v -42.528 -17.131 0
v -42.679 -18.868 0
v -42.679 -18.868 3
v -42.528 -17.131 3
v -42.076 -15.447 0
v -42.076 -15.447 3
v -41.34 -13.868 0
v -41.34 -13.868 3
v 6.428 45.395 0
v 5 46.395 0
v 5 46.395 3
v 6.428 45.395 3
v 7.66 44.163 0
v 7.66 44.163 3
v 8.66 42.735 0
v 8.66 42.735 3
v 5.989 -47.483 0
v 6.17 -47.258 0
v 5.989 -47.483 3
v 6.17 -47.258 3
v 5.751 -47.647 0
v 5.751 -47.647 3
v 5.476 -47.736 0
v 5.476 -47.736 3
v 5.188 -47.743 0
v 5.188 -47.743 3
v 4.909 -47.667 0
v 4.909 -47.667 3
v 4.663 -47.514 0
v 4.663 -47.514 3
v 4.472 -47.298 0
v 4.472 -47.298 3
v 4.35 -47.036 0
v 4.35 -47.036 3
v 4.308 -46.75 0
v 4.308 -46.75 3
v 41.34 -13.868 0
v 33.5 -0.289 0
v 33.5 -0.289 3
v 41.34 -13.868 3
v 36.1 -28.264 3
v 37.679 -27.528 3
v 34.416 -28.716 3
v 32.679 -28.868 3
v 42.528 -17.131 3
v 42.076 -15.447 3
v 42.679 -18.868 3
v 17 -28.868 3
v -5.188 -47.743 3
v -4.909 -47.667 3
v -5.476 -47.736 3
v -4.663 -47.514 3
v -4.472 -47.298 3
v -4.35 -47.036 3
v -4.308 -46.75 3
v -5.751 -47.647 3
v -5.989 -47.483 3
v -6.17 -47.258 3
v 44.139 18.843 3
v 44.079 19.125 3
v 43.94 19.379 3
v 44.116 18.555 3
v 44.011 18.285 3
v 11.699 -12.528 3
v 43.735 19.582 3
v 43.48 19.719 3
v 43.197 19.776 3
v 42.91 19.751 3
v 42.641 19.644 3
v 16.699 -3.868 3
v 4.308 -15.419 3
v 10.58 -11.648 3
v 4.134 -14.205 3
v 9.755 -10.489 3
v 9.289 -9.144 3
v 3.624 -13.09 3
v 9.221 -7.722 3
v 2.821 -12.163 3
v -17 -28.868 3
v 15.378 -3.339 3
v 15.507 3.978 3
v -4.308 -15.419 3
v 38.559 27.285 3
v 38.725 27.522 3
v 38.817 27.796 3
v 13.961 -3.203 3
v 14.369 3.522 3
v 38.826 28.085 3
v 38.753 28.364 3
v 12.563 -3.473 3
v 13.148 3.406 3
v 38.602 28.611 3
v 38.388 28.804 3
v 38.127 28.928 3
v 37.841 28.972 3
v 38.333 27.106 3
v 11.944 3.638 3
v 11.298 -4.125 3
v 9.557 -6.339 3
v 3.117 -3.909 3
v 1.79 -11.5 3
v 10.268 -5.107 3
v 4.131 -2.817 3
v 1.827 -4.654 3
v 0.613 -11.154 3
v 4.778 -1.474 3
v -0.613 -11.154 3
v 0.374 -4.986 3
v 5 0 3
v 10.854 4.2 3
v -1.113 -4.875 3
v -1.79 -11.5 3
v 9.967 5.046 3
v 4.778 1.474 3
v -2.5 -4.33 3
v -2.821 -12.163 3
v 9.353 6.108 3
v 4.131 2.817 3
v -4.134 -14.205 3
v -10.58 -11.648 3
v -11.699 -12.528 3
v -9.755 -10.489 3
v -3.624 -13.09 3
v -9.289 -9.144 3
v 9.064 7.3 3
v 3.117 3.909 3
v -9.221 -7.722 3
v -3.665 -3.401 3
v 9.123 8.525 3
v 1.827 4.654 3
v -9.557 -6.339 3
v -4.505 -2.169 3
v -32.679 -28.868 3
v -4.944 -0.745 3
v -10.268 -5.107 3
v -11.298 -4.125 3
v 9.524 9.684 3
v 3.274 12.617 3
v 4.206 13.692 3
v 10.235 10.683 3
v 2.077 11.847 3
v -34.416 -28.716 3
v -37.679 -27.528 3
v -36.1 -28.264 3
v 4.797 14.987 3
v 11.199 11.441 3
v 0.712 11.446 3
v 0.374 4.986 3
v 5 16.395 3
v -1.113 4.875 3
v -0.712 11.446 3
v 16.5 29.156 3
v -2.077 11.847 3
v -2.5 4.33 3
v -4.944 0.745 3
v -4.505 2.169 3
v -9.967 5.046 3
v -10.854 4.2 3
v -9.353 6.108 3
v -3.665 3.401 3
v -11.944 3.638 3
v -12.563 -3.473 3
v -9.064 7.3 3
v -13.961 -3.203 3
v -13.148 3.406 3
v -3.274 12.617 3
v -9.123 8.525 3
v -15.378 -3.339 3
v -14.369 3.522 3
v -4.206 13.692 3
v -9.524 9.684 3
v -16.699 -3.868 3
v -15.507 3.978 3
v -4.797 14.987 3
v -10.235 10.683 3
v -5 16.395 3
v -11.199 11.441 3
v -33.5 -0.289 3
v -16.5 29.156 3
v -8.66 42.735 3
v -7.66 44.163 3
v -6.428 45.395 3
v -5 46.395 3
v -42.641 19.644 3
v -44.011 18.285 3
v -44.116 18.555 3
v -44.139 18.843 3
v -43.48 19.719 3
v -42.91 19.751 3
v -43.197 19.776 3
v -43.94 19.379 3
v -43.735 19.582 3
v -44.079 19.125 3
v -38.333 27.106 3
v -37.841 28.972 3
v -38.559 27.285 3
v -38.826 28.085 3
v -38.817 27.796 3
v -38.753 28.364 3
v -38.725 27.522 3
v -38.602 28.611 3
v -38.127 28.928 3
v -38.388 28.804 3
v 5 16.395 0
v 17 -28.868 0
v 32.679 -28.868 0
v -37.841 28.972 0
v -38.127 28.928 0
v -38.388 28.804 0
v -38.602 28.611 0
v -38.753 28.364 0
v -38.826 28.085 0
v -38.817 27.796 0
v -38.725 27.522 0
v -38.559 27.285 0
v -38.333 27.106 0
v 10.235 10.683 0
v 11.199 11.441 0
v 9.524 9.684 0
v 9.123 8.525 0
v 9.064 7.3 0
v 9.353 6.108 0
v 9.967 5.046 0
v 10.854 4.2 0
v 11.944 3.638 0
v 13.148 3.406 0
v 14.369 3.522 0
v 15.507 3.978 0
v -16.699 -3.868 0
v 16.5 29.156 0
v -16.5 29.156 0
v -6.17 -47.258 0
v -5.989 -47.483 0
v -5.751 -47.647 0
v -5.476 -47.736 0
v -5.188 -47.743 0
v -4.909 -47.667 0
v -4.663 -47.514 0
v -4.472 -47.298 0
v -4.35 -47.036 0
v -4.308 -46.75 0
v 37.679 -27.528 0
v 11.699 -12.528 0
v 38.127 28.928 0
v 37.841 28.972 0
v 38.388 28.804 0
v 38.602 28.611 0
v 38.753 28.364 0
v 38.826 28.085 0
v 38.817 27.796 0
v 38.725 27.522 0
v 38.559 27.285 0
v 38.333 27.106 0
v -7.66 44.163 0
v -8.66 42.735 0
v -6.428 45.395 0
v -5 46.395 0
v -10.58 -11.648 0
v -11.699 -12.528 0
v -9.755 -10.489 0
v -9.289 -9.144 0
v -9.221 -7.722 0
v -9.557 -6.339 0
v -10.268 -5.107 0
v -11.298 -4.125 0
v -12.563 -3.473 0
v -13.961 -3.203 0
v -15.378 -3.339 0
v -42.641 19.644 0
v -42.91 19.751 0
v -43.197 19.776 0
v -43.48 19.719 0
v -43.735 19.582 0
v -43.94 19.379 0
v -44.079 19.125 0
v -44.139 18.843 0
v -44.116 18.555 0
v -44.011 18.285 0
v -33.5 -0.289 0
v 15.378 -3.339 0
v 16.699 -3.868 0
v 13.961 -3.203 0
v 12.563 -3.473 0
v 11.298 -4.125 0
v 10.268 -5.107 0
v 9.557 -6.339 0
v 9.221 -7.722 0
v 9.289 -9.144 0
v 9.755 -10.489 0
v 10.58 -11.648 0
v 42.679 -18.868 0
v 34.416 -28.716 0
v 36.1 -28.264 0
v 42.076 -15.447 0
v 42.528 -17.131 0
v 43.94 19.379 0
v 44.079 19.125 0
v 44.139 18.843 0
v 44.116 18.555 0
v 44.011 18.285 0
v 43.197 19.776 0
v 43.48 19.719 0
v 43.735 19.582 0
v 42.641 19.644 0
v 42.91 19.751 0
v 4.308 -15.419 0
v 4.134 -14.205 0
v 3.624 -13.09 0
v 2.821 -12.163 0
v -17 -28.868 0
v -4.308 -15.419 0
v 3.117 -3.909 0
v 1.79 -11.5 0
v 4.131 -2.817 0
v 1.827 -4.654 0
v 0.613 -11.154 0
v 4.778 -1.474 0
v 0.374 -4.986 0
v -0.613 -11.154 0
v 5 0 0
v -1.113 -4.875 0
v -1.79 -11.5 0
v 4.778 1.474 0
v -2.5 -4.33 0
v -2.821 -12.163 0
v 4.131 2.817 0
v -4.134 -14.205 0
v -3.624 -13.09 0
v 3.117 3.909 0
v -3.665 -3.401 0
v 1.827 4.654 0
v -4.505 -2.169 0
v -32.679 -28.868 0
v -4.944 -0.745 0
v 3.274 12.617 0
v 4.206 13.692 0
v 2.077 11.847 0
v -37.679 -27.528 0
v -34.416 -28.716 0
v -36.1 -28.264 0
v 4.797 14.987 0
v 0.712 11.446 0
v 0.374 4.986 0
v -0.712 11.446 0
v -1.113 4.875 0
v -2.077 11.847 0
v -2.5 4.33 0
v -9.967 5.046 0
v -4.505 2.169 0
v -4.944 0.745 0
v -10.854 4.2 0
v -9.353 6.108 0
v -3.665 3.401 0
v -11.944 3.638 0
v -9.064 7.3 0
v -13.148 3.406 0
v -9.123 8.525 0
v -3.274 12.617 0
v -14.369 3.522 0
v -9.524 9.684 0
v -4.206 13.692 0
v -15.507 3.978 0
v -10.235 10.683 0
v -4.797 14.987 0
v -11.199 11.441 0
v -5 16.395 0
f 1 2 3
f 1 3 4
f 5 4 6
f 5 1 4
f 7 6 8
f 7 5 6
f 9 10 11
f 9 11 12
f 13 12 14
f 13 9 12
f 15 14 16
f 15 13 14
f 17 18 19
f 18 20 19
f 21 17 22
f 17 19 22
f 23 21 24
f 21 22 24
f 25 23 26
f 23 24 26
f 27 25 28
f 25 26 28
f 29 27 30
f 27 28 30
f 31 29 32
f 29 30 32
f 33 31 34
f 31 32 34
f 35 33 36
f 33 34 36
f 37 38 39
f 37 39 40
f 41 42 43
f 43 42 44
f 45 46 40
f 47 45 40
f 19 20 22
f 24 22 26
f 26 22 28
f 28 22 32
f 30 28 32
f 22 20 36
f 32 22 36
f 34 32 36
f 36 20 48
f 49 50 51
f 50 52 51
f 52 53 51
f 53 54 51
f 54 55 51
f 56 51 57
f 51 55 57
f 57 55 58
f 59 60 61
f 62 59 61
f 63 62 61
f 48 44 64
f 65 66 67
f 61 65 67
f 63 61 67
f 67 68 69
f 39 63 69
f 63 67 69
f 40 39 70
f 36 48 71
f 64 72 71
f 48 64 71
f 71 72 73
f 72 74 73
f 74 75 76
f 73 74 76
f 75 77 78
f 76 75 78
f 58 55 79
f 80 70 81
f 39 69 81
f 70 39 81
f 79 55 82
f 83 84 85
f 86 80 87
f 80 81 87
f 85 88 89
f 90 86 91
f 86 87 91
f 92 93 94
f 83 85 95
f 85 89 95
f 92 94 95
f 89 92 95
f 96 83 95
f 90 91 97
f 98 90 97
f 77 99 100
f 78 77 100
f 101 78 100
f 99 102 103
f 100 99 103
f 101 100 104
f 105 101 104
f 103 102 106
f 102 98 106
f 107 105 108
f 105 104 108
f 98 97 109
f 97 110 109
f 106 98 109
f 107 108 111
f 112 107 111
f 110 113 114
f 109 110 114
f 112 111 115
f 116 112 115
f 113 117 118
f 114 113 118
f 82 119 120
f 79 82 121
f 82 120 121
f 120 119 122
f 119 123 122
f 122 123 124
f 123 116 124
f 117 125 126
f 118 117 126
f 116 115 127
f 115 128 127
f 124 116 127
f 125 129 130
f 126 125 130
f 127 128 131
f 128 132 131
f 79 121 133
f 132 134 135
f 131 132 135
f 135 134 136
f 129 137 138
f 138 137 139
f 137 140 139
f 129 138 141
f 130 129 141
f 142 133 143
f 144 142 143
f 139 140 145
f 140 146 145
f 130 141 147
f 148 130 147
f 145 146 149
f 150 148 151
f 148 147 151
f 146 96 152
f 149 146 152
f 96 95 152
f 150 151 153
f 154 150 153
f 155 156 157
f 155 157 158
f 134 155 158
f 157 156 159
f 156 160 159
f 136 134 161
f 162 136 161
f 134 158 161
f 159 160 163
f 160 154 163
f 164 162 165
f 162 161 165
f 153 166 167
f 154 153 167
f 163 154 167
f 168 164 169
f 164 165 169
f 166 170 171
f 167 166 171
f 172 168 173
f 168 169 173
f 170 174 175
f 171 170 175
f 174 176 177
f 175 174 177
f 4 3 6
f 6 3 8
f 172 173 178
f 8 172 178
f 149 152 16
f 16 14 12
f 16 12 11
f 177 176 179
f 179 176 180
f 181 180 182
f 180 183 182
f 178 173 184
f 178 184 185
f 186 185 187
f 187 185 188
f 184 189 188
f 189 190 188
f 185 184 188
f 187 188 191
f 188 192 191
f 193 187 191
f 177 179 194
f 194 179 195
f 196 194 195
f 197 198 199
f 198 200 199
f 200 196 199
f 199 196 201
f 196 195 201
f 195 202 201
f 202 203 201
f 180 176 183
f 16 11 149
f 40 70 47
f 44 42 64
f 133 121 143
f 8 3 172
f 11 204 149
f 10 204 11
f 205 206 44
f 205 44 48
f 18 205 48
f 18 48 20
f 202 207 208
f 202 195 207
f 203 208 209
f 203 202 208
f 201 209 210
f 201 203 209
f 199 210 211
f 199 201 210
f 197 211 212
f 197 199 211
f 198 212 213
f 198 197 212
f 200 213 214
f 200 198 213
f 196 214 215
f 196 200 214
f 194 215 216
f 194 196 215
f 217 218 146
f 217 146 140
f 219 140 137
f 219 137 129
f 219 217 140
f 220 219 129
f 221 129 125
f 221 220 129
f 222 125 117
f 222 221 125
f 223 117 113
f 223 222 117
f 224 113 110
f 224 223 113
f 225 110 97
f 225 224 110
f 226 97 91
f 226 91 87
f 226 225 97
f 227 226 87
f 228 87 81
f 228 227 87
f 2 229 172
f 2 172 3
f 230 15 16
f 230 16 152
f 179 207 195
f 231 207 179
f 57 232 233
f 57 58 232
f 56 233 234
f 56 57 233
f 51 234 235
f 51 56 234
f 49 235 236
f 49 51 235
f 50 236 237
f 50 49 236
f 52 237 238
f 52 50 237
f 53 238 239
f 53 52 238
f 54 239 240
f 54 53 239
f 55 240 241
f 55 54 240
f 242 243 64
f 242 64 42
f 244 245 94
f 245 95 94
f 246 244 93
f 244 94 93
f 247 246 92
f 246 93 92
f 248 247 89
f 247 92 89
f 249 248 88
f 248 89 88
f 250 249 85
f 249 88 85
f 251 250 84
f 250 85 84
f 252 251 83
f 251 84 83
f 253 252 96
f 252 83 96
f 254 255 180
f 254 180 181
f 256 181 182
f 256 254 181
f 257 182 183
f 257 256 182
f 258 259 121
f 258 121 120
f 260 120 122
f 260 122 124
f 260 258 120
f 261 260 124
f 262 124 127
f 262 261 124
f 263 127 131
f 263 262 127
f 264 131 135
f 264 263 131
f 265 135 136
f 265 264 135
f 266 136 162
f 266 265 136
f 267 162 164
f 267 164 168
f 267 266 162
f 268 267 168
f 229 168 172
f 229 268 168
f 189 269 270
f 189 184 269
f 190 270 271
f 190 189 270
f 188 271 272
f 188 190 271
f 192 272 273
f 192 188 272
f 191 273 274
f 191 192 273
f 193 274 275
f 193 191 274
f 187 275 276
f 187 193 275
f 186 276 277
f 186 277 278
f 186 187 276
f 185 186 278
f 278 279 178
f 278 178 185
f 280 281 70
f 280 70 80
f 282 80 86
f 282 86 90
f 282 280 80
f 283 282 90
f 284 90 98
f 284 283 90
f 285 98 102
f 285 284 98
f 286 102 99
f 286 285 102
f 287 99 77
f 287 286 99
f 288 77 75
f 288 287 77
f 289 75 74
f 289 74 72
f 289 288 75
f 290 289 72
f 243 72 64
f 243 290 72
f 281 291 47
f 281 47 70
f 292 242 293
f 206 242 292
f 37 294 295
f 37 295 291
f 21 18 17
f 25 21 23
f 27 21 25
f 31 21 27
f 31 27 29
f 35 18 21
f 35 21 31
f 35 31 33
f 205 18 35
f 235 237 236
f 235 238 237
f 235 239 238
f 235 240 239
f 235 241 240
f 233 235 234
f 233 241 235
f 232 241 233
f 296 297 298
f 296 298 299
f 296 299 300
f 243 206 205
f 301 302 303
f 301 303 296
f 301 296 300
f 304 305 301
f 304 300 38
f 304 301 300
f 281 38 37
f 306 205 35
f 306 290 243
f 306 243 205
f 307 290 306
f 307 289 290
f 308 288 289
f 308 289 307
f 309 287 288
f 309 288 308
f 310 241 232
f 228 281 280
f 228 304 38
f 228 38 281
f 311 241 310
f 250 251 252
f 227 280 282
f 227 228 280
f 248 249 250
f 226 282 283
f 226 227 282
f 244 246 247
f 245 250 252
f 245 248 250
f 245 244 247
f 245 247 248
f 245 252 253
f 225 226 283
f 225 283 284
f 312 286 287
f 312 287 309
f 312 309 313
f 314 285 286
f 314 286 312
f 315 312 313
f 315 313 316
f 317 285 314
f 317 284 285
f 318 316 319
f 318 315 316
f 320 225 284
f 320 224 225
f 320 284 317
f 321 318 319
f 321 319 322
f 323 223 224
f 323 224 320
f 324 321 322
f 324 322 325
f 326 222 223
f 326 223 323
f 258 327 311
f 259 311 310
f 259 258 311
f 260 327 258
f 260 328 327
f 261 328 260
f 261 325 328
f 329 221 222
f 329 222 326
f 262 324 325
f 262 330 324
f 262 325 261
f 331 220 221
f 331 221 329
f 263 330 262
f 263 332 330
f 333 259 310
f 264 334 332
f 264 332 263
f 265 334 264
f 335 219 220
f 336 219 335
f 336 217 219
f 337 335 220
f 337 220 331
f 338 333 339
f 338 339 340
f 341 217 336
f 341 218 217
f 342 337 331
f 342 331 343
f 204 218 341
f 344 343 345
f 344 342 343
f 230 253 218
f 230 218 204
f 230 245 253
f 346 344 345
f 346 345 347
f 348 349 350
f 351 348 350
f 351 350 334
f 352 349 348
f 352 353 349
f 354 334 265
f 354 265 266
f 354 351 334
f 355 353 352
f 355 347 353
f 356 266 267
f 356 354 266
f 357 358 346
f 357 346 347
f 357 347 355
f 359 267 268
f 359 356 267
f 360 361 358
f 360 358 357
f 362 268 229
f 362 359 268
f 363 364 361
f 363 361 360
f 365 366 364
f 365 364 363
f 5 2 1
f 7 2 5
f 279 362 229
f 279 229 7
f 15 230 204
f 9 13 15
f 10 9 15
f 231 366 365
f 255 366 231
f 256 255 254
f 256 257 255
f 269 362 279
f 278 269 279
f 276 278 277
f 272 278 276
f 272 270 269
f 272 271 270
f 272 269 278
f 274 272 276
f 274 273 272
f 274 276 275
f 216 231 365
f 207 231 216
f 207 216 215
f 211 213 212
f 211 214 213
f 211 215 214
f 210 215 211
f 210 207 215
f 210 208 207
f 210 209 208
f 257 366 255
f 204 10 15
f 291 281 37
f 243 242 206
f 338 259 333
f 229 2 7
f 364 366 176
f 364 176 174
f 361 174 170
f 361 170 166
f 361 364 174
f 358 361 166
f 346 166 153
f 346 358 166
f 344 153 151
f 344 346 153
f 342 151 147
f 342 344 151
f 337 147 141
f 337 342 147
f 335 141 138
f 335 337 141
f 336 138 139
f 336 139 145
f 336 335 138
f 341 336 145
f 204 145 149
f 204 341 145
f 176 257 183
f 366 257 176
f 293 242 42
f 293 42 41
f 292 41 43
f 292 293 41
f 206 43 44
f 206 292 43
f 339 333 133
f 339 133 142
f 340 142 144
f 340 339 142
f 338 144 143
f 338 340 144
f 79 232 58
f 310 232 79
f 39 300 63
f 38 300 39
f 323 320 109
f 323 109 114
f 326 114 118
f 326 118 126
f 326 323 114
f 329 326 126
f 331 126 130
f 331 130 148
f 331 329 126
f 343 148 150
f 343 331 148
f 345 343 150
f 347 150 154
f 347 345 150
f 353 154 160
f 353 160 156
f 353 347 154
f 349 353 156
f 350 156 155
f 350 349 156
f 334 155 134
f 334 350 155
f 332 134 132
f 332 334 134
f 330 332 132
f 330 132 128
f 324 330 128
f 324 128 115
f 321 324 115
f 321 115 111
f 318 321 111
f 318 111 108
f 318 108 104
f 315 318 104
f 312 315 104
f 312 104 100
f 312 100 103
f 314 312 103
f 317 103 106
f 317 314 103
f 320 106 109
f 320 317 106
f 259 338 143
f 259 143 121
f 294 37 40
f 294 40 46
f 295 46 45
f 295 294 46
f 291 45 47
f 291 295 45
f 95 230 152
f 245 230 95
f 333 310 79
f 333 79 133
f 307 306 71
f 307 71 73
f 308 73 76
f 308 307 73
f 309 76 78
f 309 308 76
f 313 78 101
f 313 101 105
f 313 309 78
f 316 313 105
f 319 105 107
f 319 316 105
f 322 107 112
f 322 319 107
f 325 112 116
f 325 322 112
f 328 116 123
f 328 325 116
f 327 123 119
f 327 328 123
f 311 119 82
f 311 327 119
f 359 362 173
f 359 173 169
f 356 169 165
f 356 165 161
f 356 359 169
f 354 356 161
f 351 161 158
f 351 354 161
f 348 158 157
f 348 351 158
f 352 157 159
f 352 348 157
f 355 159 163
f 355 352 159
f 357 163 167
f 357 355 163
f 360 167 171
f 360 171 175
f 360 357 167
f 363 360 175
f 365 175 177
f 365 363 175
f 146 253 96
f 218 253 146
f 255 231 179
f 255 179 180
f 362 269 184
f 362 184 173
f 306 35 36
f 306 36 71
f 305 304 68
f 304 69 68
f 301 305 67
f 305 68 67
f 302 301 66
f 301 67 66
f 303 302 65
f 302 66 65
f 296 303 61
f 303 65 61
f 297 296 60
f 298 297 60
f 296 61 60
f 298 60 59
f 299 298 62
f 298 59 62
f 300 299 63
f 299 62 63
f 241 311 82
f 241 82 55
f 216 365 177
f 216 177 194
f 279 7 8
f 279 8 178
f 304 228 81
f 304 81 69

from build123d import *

# Parameters (mm, degrees)
SKETCH1_R           = 5
BOSS_EXTRUDE1_DEPTH = 3
FILLET1_R           = 1


with BuildPart() as part:
    # Sketch1 → Boss-Extrude1 (new body)
    with BuildSketch(Plane.XY):
        with BuildLine():
            Line((-5, 46.395280957), (-5, 16.395280957))
            ThreePointArc((-5, 16.395280957), (0, 11.395280957), (5, 16.395280957))
            Line((5, 16.395280957), (5, 46.395280957))
            ThreePointArc((5, 46.395280957), (7.071067812, 44.806094731), (8.660254038, 42.735026919))
            Line((8.660254038, 42.735026919), (16.5, 29.156188594))
            Line((16.5, 29.156188594), (41.509870079, 28.940674337))
            Line((41.509870079, 28.940674337), (11.198980946, 11.440674337))
            ThreePointArc((11.198980946, 11.440674337), (9.621988261, 5.555257513), (15.507405085, 3.978264828))
            Line((15.507405085, 3.978264828), (45.818294218, 21.478264828))
            Line((45.818294218, 21.478264828), (33.5, -0.288675135))
            Line((33.5, -0.288675135), (41.339745962, -13.867513459))
            ThreePointArc((41.339745962, -13.867513459), (42.338750187, -16.279323008), (42.679491924, -18.867513459))
            Line((42.679491924, -18.867513459), (16.698729811, -3.867513459))
            ThreePointArc((16.698729811, -3.867513459), (9.868602792, -5.697640478), (11.698729811, -12.527767497))
            Line((11.698729811, -12.527767497), (37.679491924, -27.527767497))
            ThreePointArc((37.679491924, -27.527767497), (35.267682375, -28.526771722), (32.679491924, -28.867513459))
            Line((32.679491924, -28.867513459), (17, -28.867513459))
            Line((17, -28.867513459), (4.308424139, -50.418939165))
            Line((4.308424139, -50.418939165), (4.308424139, -15.418939165))
            ThreePointArc((4.308424139, -15.418939165), (0, -11.110515025), (-4.308424139, -15.418939165))
            Line((-4.308424139, -15.418939165), (-4.308424139, -50.418939165))
            Line((-4.308424139, -50.418939165), (-17, -28.867513459))
            Line((-17, -28.867513459), (-32.679491924, -28.867513459))
            ThreePointArc((-32.679491924, -28.867513459), (-35.267682375, -28.526771722), (-37.679491924, -27.527767497))
            Line((-37.679491924, -27.527767497), (-11.698729811, -12.527767497))
            ThreePointArc((-11.698729811, -12.527767497), (-9.868602792, -5.697640478), (-16.698729811, -3.867513459))
            Line((-16.698729811, -3.867513459), (-42.679491924, -18.867513459))
            ThreePointArc((-42.679491924, -18.867513459), (-42.338750187, -16.279323008), (-41.339745962, -13.867513459))
            Line((-41.339745962, -13.867513459), (-33.5, -0.288675135))
            Line((-33.5, -0.288675135), (-45.818294218, 21.478264828))
            Line((-45.818294218, 21.478264828), (-15.507405085, 3.978264828))
            ThreePointArc((-15.507405085, 3.978264828), (-9.621988261, 5.555257513), (-11.198980946, 11.440674337))
            Line((-11.198980946, 11.440674337), (-41.509870079, 28.940674337))
            Line((-41.509870079, 28.940674337), (-16.5, 29.156188594))
            Line((-16.5, 29.156188594), (-8.660254038, 42.735026919))
            ThreePointArc((-8.660254038, 42.735026919), (-7.071067812, 44.806094731), (-5, 46.395280957))
        make_face()
        Circle(SKETCH1_R, mode=Mode.SUBTRACT)
    extrude(amount=BOSS_EXTRUDE1_DEPTH)

    # Fillet1
    fillet1_edges = [part.edges().sort_by_distance(p)[0] for p in [
        (41.509870079, 28.940674337, 1.5),
        (45.818294218, 21.478264828, 1.5),
        (4.308424139, -50.418939165, 1.5),
        (-4.308424139, -50.418939165, 1.5),
        (-45.818294218, 21.478264828, 1.5),
        (-41.509870079, 28.940674337, 1.5),
    ]]
    fillet(fillet1_edges, radius=FILLET1_R)


solid = part.part
